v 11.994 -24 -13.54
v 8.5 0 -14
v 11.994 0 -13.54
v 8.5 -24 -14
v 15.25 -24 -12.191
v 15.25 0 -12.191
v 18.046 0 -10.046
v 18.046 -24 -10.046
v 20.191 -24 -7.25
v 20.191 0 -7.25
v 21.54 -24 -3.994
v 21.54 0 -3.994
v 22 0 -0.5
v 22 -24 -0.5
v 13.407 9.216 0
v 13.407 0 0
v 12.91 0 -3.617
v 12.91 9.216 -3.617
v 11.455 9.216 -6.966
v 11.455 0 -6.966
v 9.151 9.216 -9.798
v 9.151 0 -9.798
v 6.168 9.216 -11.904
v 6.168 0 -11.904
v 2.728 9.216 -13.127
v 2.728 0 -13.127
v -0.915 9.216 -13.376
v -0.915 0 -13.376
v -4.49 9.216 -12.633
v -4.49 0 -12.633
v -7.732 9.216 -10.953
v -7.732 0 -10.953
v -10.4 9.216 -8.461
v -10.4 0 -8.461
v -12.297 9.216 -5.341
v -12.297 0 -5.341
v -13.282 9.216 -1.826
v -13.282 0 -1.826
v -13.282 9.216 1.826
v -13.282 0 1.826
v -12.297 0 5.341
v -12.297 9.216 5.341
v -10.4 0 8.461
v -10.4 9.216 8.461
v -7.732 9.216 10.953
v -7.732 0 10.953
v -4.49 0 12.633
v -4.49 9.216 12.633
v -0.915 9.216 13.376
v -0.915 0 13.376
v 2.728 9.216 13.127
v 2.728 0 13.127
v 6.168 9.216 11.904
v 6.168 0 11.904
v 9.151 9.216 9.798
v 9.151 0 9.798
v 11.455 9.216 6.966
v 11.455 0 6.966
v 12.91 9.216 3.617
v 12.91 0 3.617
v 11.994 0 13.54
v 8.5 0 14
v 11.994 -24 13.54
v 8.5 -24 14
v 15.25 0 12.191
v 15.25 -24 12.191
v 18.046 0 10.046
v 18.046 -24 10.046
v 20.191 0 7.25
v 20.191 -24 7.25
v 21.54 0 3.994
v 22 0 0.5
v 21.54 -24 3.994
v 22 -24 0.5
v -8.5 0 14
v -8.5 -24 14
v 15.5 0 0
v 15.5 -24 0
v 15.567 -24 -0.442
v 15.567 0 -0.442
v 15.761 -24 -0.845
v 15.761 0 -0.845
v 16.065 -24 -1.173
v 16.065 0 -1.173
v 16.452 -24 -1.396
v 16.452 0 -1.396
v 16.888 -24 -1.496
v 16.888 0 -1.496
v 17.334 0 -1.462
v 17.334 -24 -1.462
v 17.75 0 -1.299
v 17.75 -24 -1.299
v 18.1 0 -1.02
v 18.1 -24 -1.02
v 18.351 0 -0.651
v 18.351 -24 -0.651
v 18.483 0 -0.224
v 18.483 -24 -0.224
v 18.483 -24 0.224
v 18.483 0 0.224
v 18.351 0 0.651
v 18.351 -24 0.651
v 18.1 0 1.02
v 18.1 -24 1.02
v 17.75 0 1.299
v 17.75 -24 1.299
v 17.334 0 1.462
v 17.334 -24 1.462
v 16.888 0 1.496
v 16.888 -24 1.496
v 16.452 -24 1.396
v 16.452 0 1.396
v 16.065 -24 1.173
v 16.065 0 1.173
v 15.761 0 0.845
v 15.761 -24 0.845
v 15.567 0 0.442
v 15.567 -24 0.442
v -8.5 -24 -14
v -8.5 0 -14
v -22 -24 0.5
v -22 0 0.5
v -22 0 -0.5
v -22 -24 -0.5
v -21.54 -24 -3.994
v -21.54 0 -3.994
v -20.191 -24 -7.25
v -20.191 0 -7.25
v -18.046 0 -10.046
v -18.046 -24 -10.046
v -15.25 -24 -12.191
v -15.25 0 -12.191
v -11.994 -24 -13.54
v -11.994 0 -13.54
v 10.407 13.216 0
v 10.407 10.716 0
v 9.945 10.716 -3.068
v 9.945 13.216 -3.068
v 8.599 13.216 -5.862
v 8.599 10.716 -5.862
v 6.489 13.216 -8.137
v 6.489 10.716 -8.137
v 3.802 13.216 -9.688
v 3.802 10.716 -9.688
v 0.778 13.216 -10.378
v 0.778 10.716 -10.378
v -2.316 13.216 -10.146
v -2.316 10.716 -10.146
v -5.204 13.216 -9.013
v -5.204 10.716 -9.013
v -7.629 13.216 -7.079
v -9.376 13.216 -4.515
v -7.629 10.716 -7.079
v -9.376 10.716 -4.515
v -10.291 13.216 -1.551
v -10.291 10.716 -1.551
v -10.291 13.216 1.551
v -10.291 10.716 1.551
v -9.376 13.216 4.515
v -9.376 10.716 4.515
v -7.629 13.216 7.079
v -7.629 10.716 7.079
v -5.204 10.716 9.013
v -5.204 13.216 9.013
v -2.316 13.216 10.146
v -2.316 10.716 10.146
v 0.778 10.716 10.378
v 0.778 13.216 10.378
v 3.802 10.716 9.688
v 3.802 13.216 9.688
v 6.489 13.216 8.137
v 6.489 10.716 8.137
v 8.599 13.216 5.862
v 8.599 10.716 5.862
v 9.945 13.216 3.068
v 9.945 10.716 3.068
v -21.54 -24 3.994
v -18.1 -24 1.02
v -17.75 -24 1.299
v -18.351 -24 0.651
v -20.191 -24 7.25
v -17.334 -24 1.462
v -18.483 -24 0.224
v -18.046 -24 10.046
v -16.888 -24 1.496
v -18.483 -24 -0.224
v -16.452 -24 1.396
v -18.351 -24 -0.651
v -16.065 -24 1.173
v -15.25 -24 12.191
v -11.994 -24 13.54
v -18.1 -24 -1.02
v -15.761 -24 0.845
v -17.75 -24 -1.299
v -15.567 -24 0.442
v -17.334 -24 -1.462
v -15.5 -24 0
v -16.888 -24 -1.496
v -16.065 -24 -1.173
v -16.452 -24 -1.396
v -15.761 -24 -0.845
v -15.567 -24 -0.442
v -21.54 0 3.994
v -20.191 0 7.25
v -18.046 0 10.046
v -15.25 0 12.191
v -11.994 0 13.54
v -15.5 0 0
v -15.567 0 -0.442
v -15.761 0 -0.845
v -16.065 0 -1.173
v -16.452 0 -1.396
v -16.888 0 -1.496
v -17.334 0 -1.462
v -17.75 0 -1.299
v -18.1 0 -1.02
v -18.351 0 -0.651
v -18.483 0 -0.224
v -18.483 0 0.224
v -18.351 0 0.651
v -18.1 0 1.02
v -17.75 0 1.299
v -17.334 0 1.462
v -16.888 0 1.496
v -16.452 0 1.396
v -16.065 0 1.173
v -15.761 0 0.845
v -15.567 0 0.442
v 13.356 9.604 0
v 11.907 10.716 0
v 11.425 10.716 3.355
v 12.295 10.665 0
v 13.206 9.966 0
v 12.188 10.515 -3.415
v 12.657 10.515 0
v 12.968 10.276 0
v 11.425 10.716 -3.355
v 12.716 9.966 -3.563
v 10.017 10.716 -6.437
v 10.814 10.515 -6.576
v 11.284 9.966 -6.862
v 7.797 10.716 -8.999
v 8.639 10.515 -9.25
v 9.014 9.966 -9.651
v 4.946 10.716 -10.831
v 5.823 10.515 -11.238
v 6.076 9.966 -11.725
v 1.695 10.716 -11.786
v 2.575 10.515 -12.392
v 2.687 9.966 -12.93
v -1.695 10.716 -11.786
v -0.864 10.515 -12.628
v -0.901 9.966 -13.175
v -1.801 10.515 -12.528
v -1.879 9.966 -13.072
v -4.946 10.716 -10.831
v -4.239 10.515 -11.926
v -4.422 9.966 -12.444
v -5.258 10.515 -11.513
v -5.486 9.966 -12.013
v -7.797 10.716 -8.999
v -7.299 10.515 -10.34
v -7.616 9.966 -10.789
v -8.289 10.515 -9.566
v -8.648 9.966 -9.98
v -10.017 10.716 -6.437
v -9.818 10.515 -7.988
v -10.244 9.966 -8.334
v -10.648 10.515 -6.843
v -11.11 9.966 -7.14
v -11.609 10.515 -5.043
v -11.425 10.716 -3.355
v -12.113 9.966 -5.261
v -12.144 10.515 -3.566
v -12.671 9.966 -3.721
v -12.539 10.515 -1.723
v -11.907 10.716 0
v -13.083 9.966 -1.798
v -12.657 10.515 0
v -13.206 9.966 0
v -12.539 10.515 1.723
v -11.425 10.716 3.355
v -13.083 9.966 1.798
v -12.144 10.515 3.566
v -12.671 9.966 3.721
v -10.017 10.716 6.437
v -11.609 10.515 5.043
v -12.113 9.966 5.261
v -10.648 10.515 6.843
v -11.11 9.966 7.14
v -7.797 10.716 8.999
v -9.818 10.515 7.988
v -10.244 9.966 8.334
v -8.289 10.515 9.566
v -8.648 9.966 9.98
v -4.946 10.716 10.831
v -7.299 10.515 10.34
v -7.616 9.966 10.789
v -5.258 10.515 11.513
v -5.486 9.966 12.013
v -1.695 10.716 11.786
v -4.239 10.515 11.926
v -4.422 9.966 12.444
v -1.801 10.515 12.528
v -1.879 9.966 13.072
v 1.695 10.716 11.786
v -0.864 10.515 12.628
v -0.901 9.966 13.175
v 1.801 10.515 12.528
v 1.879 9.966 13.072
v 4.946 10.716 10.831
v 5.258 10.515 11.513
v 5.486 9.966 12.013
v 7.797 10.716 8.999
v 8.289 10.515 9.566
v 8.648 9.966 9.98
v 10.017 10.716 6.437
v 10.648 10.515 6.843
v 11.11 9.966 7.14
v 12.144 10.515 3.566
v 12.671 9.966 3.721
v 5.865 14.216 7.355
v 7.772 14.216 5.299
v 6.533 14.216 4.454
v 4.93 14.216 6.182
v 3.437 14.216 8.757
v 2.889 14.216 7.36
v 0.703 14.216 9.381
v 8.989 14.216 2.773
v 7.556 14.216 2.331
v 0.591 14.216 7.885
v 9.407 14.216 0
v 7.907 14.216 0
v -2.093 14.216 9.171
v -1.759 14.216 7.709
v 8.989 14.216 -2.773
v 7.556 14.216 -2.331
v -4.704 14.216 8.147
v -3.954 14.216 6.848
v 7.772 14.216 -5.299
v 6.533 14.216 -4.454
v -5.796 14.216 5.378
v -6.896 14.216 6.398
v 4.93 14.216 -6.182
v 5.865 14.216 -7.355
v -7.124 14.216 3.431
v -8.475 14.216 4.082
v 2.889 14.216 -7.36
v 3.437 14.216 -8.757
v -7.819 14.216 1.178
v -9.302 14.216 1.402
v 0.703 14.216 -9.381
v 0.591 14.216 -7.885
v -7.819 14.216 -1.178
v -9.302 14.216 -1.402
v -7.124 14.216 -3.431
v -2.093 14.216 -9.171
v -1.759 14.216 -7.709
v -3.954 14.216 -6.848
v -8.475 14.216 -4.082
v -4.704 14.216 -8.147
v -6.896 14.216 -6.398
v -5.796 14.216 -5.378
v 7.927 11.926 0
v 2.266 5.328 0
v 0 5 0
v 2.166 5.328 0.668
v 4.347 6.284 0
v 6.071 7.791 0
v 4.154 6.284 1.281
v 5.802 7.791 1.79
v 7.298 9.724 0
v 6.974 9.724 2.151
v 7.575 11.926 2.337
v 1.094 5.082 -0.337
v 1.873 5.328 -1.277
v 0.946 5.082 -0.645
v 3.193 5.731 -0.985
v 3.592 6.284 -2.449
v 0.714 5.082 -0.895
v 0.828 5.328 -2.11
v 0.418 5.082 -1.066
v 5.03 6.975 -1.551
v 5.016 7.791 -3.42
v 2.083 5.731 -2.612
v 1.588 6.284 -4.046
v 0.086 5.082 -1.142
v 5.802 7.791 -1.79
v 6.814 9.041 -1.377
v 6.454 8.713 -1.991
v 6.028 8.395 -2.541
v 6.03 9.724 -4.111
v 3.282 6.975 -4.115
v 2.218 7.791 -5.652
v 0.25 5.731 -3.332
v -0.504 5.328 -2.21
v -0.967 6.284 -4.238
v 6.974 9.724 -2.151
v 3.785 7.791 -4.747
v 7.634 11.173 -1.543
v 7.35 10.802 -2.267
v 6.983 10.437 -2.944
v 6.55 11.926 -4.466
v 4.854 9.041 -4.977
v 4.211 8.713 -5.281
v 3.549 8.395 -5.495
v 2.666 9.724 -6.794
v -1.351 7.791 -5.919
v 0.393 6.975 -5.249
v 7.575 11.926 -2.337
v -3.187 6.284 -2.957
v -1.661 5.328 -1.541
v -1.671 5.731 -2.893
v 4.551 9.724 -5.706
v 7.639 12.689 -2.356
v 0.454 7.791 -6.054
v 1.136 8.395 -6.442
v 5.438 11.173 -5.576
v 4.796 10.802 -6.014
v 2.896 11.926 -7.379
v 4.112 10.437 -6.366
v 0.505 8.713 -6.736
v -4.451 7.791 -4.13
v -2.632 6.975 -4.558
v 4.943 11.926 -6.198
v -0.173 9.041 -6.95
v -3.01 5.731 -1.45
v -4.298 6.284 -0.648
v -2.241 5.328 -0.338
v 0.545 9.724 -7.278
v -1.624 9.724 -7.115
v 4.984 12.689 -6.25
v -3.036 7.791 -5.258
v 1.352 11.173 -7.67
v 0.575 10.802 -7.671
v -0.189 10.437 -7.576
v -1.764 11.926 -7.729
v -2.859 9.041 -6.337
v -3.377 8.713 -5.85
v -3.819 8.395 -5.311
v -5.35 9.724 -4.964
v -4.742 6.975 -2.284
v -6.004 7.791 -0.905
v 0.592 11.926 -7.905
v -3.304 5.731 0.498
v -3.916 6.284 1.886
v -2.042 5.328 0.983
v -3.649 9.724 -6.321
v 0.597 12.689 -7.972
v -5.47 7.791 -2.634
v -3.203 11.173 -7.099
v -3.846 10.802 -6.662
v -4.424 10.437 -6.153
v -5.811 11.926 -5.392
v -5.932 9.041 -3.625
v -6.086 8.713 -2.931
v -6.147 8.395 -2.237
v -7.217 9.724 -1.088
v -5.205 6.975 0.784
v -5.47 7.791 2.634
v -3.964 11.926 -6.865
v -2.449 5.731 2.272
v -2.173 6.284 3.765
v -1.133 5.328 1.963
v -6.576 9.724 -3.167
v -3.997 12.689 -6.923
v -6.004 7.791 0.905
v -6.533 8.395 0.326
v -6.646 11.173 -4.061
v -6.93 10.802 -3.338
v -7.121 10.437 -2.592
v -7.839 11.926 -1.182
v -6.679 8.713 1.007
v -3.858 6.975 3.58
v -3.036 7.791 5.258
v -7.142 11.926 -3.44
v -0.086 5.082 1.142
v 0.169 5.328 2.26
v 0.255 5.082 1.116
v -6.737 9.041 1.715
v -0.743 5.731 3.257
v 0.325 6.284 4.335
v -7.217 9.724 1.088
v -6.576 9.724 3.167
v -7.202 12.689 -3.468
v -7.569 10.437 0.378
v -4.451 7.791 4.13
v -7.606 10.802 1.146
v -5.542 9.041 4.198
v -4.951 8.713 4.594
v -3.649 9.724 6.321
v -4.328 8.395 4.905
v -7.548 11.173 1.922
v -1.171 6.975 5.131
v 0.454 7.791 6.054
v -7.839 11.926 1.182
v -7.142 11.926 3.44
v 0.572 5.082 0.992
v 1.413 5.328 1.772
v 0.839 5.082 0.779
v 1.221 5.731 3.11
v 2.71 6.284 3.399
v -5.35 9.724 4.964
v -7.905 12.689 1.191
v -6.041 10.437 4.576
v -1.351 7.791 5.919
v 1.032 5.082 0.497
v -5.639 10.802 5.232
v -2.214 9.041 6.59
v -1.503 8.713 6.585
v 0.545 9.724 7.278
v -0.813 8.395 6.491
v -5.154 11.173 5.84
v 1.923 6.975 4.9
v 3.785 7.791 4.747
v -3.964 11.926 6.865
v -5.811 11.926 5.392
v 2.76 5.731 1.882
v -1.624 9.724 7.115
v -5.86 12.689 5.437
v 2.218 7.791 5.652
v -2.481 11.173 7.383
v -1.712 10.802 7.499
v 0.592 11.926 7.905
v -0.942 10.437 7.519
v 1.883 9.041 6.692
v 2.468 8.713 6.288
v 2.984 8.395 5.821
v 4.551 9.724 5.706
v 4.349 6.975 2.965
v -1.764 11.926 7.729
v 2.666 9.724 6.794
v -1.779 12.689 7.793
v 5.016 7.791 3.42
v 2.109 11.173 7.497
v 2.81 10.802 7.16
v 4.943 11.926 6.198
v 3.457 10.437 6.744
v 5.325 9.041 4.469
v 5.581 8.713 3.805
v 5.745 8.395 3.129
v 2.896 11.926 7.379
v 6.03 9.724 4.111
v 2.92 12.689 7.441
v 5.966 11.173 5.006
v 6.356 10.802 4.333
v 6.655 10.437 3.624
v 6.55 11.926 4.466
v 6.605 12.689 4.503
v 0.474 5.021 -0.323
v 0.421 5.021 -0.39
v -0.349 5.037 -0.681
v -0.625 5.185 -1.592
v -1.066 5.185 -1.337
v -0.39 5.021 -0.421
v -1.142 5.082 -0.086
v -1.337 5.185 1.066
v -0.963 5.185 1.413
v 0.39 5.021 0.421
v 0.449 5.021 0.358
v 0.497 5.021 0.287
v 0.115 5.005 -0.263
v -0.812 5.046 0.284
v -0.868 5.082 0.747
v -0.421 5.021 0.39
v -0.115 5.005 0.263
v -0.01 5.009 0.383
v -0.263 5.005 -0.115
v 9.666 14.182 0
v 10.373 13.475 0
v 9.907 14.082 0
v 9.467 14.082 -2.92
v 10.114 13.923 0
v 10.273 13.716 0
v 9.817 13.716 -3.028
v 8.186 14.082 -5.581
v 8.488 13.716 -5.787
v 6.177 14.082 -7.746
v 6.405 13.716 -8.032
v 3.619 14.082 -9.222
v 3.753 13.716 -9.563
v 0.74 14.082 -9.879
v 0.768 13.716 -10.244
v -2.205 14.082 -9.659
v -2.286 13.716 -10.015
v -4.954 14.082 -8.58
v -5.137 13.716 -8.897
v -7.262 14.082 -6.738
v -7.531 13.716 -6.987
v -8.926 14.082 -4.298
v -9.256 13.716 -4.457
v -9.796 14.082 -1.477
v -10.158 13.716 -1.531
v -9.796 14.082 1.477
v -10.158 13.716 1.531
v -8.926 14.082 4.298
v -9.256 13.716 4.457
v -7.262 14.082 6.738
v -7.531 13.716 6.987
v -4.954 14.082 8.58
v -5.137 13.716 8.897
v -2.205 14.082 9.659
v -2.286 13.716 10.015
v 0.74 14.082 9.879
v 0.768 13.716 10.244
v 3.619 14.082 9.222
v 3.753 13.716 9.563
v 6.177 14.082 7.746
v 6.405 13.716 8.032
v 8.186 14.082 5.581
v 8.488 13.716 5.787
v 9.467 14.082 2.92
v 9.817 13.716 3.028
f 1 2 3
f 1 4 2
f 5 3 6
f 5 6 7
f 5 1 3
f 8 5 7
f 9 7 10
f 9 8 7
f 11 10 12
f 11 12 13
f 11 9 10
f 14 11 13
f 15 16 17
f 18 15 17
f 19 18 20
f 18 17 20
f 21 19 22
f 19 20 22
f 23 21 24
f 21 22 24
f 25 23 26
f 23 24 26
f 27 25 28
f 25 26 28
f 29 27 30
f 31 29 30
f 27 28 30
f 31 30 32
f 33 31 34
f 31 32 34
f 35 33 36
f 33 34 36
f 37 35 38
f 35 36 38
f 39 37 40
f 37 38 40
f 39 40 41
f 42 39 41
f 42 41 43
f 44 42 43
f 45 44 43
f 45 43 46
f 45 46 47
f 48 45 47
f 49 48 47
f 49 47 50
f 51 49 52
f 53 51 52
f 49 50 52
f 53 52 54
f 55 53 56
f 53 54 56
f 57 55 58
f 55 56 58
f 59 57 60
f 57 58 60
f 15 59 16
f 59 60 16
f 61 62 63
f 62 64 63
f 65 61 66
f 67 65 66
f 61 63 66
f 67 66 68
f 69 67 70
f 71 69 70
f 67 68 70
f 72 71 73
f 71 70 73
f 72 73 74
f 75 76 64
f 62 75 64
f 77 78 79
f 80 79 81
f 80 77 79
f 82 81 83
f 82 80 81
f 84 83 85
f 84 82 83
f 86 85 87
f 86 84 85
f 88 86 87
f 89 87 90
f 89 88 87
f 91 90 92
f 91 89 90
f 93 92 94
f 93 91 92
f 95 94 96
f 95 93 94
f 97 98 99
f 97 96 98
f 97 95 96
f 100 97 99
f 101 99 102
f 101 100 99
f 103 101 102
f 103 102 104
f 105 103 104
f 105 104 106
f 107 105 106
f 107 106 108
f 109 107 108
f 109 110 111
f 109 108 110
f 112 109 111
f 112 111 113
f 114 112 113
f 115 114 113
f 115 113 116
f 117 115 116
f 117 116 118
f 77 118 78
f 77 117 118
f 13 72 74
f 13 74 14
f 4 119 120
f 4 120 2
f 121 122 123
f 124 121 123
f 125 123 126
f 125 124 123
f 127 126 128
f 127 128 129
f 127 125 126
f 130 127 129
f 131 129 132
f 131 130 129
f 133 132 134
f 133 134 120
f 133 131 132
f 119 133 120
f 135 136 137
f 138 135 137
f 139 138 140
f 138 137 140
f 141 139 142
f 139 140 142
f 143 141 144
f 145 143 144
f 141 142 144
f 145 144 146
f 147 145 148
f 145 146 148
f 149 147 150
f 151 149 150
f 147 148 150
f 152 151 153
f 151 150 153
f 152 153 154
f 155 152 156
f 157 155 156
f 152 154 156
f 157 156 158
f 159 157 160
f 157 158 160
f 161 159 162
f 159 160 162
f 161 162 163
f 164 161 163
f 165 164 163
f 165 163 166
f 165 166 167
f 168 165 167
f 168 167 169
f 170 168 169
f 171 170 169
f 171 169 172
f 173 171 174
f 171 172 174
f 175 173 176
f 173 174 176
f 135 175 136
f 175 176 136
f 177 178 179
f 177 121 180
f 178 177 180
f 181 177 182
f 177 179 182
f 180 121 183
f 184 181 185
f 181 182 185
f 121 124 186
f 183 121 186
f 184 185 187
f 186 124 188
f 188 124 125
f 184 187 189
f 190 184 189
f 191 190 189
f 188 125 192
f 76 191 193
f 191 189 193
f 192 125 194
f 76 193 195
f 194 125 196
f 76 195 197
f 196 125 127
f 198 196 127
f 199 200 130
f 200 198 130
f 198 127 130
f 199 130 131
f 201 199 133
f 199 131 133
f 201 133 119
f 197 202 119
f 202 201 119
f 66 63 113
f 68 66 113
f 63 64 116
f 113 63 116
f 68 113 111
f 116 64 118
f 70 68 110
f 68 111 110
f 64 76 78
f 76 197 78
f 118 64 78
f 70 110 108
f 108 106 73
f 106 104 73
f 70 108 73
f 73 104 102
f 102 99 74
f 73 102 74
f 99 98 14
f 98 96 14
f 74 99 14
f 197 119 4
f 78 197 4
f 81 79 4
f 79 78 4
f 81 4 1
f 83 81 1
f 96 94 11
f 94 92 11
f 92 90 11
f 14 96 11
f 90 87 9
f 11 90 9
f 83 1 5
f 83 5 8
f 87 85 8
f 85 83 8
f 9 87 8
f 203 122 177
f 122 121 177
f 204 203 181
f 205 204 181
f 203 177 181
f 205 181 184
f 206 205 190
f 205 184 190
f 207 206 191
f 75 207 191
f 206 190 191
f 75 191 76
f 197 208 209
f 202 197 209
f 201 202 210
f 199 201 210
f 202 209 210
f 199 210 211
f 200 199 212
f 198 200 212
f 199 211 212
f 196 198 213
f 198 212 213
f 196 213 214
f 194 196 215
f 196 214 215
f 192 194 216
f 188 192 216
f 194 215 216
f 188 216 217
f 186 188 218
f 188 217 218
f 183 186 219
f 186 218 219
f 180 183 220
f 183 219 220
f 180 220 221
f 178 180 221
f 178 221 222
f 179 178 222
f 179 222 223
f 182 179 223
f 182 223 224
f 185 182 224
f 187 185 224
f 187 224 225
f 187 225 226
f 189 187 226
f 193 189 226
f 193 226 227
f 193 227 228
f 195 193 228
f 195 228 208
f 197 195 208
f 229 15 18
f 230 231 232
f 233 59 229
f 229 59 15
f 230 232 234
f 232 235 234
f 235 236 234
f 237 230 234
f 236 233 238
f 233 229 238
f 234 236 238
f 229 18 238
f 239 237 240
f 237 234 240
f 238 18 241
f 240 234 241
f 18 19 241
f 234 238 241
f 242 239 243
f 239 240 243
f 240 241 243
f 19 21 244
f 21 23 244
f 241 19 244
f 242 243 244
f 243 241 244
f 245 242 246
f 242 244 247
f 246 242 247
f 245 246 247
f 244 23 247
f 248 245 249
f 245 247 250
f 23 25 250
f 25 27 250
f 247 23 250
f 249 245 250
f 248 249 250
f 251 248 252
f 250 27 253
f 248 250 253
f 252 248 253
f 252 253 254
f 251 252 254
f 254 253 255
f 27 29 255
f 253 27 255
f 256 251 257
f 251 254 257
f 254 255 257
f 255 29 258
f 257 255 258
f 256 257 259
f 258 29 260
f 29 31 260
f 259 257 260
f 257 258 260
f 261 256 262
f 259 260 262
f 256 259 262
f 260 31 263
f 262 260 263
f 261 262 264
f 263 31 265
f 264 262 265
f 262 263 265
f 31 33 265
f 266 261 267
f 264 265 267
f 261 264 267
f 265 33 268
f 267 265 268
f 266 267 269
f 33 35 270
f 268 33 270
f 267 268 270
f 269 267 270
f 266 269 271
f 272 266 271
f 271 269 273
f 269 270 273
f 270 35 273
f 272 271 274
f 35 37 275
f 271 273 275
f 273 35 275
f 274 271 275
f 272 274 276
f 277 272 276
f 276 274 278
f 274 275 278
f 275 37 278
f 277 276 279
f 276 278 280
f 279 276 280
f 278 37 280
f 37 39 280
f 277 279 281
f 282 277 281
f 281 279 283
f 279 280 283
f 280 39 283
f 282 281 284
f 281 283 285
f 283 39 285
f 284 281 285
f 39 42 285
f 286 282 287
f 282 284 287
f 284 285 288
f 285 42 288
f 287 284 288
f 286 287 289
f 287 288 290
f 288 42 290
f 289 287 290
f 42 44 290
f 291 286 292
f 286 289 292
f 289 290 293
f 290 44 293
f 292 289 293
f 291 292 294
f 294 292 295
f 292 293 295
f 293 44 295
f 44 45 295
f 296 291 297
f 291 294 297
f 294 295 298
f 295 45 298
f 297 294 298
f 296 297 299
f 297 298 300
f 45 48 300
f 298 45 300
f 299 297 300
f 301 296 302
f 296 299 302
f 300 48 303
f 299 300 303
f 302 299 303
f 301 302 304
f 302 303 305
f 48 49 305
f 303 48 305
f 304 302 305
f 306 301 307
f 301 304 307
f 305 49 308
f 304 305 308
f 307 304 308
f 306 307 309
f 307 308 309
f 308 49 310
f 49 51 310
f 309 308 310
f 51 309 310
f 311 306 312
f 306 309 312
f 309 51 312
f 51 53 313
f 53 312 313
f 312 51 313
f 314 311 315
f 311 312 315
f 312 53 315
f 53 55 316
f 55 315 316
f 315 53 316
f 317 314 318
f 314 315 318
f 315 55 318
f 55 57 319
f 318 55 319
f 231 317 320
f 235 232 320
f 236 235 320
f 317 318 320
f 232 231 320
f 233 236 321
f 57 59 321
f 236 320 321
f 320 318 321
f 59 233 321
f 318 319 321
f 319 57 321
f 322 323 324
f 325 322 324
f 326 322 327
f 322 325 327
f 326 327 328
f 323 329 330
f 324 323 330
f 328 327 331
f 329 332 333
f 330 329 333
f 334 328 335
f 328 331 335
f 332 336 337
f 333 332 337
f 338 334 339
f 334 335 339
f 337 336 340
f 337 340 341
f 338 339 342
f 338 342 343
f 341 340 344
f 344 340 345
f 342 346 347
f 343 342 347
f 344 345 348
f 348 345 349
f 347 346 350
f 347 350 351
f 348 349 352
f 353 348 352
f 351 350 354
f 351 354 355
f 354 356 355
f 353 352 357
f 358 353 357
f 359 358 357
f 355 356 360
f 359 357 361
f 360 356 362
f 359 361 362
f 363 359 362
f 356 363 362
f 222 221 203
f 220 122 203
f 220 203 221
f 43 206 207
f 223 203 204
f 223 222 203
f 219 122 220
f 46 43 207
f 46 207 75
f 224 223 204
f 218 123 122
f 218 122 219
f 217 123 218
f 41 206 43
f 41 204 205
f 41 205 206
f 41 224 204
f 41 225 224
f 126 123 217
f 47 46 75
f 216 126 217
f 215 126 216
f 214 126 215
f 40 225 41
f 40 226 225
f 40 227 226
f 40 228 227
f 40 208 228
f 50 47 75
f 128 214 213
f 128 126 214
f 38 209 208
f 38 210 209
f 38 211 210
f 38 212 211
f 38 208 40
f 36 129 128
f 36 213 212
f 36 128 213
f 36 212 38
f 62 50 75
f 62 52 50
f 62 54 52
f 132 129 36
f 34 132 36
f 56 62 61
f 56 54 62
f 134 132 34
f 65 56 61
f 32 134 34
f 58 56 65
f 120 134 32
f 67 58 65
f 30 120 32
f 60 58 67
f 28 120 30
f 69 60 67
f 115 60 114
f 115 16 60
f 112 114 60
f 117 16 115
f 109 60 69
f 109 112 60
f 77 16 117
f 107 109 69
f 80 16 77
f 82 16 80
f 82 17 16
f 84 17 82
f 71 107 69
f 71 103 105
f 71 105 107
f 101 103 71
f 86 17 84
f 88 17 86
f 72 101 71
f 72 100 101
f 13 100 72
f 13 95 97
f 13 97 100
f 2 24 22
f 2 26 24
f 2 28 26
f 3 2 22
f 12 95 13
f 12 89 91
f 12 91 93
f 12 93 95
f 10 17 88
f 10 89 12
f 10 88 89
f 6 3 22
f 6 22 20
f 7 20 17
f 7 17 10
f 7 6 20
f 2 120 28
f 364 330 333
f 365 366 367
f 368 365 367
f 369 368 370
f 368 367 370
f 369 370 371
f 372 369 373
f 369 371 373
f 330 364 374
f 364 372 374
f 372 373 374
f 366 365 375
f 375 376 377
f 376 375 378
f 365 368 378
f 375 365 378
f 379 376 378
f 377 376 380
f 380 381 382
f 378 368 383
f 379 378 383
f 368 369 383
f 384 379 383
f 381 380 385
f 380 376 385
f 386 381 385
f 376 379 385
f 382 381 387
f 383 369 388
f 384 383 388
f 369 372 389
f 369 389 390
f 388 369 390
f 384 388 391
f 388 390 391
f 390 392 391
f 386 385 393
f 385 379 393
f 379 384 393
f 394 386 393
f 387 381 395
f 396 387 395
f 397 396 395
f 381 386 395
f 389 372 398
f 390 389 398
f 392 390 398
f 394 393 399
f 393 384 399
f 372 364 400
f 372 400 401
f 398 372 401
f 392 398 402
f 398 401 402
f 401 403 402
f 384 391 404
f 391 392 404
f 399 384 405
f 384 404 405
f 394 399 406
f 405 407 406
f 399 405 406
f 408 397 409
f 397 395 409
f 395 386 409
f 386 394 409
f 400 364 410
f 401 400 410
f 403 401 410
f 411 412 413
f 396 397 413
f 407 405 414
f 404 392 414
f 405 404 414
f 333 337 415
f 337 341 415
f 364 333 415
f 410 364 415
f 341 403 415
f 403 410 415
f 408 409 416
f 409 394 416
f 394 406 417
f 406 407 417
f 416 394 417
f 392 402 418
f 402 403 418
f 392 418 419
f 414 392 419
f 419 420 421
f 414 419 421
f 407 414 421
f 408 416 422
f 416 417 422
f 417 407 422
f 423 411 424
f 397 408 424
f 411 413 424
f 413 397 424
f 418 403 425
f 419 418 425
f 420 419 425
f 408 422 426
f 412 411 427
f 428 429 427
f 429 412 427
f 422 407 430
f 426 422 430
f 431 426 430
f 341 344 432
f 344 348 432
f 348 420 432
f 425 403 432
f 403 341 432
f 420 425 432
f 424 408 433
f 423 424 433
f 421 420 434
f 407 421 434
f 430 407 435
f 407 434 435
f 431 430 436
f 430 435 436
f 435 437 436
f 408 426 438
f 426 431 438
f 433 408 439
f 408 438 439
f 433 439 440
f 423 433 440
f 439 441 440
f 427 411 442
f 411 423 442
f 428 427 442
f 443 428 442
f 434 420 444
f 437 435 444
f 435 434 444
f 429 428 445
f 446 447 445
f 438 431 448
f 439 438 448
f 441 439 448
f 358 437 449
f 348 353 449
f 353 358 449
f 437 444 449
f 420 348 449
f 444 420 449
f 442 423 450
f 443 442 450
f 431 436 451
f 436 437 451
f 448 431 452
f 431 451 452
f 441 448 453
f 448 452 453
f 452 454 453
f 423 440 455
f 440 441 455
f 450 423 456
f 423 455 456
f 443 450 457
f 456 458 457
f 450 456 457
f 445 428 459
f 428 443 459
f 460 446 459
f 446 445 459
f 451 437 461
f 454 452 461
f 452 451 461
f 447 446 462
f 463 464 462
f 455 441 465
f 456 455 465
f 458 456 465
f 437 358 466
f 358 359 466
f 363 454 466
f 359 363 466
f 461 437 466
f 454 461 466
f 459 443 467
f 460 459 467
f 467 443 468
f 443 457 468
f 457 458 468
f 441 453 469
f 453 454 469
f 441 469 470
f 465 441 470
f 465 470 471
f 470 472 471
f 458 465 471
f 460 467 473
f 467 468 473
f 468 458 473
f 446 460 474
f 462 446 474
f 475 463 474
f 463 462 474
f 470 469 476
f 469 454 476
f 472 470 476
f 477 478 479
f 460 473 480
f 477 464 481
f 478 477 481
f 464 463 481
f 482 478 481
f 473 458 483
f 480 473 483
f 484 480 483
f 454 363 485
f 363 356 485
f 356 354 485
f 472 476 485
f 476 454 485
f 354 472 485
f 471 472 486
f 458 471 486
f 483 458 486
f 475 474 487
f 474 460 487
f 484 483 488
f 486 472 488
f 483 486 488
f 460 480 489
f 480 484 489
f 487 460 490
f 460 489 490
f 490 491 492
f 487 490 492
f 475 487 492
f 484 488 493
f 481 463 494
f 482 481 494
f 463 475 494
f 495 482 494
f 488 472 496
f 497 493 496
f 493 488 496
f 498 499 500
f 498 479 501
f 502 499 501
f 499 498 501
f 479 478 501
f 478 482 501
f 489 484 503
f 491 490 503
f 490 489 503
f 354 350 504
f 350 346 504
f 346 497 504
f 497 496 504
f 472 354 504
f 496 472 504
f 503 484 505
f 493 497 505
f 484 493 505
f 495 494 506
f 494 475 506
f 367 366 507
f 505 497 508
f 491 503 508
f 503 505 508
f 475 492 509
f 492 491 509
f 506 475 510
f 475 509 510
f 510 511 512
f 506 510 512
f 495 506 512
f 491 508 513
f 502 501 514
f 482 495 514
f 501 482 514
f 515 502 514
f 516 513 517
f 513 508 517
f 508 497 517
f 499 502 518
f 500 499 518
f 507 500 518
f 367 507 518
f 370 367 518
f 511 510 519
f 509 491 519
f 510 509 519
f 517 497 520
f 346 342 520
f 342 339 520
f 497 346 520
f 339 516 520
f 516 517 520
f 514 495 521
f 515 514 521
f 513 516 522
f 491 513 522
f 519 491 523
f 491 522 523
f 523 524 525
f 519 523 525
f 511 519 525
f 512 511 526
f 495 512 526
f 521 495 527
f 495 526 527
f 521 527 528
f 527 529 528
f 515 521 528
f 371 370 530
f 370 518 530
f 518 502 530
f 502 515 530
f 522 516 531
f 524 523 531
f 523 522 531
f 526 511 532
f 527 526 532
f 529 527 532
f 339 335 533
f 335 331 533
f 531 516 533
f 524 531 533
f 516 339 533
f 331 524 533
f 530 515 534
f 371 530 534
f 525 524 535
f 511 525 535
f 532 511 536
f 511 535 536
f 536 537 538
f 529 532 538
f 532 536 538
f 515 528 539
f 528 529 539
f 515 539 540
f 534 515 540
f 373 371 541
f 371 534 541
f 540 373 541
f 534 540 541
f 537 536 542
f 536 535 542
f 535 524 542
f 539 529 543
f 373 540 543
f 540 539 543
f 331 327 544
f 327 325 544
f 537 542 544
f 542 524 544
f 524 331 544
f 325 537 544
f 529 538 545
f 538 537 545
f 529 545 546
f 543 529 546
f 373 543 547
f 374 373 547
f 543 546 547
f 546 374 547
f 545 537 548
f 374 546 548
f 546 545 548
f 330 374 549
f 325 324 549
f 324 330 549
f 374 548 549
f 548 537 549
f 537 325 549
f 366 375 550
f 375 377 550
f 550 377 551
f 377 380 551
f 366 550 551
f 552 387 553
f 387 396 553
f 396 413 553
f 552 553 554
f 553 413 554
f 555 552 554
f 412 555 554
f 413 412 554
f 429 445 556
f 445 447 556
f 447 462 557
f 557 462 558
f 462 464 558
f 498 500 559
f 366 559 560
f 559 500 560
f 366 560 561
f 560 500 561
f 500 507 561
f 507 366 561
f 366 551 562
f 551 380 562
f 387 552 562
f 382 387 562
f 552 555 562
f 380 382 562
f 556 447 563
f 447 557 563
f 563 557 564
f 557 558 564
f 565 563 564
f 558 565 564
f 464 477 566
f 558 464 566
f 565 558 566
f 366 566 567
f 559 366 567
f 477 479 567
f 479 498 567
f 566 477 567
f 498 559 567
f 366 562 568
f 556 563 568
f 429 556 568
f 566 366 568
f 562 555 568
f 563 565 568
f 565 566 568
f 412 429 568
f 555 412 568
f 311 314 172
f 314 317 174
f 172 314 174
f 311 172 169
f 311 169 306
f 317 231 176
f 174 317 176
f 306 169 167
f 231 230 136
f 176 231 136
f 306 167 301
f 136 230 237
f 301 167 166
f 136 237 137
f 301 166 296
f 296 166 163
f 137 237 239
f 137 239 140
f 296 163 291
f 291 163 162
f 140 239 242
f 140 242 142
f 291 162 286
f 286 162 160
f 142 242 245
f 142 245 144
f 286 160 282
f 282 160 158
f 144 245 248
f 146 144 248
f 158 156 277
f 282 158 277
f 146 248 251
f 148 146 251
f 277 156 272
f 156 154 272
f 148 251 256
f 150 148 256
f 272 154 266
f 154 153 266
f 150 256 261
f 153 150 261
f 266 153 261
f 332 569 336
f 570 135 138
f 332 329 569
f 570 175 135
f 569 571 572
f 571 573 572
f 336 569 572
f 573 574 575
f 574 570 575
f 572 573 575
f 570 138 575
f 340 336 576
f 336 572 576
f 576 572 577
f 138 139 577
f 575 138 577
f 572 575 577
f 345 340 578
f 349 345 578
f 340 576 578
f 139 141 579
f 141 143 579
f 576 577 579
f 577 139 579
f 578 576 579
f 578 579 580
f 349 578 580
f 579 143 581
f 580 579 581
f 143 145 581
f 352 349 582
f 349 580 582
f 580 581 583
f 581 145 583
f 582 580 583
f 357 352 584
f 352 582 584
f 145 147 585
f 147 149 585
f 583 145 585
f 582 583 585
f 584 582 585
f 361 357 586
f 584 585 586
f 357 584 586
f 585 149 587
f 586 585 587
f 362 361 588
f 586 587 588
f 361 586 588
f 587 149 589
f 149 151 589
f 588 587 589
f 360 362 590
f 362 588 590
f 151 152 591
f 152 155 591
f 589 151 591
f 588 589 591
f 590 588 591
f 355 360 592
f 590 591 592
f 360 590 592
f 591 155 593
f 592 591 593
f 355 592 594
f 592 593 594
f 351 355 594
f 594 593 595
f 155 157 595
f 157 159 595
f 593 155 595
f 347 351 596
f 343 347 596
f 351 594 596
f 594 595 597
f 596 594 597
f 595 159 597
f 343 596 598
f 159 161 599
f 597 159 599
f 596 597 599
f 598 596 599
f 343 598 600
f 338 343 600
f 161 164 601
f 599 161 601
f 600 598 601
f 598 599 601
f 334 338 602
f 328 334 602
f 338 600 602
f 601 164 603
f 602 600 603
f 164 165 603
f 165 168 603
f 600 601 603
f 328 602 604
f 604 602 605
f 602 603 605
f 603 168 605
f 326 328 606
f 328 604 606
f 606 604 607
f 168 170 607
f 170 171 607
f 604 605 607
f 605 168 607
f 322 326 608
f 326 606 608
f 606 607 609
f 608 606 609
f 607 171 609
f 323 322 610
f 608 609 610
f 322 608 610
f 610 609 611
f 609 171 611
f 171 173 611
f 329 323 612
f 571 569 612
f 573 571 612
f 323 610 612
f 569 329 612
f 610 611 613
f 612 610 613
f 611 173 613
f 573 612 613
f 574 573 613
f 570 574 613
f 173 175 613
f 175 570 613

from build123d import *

# Parameters (mm, degrees)
FILLET1_R           = 1
FILLET2_R           = 1.5
SKETCH5_W           = 44
SKETCH5_H           = 28
BOSS_EXTRUDE1_DEPTH = 24
FILLET3_R           = 13.5
SKETCH7_R           = 1.5
CUT_EXTRUDE1_DEPTH  = 25


with BuildPart() as part:
    # Sketch1 → Revolve2 (revolve)
    with BuildSketch(Plane.XY):
        with BuildLine():
            Line((0, 0), (0, 5))
            ThreePointArc((0, 5), (6.071429533, 7.79069576), (7.907014302, 14.215714666))
            Line((7.907014302, 14.215714666), (10.407014302, 14.215714666))
            Line((10.407014302, 14.215714666), (10.407014302, 10.715714666))
            Line((10.407014302, 10.715714666), (13.407014302, 10.715714666))
            Line((13.407014302, 10.715714666), (13.407014302, 0))
            Line((13.407014302, 0), (0, 0))
        make_face()
    revolve(axis=Axis((0, 0, 0), (0, 1, 0)))

    # Fillet1
    fillet1_edges = [part.edges().sort_by_distance(p)[0] for p in [
        (-10.407014302, 14.215714666, 0),
    ]]
    fillet(fillet1_edges, radius=FILLET1_R)

    # Fillet2
    fillet2_edges = [part.edges().sort_by_distance(p)[0] for p in [
        (-13.407014302, 10.715714666, 0),
    ]]
    fillet(fillet2_edges, radius=FILLET2_R)

    # Sketch5 → Boss-Extrude1 (add)
    with BuildSketch(Plane(origin=(0, 0, 0), x_dir=(1, 0, 0), z_dir=(0, 1, 0))):
        Rectangle(SKETCH5_W, SKETCH5_H)
    extrude(amount=-BOSS_EXTRUDE1_DEPTH)

    # Fillet3
    fillet3_edges = [part.edges().sort_by_distance(p)[0] for p in [
        (-22, -12, 14),
        (-22, -12, -14),
        (22, -12, -14),
        (22, -12, 14),
    ]]
    fillet(fillet3_edges, radius=FILLET3_R)

    # Sketch7 → Cut-Extrude1 (cut, through all)
    with BuildSketch(Plane(origin=(0, 0, 0), x_dir=(1, 0, 0), z_dir=(0, 1, 0))):
        with Locations((-17, 0)):
            Circle(SKETCH7_R)
    cut_extrude1 = extrude(amount=-CUT_EXTRUDE1_DEPTH, mode=Mode.SUBTRACT)

    # Mirror1: Cut-Extrude1 across plane
    add(cut_extrude1.mirror(Plane.ZY), mode=Mode.SUBTRACT)


solid = part.part
